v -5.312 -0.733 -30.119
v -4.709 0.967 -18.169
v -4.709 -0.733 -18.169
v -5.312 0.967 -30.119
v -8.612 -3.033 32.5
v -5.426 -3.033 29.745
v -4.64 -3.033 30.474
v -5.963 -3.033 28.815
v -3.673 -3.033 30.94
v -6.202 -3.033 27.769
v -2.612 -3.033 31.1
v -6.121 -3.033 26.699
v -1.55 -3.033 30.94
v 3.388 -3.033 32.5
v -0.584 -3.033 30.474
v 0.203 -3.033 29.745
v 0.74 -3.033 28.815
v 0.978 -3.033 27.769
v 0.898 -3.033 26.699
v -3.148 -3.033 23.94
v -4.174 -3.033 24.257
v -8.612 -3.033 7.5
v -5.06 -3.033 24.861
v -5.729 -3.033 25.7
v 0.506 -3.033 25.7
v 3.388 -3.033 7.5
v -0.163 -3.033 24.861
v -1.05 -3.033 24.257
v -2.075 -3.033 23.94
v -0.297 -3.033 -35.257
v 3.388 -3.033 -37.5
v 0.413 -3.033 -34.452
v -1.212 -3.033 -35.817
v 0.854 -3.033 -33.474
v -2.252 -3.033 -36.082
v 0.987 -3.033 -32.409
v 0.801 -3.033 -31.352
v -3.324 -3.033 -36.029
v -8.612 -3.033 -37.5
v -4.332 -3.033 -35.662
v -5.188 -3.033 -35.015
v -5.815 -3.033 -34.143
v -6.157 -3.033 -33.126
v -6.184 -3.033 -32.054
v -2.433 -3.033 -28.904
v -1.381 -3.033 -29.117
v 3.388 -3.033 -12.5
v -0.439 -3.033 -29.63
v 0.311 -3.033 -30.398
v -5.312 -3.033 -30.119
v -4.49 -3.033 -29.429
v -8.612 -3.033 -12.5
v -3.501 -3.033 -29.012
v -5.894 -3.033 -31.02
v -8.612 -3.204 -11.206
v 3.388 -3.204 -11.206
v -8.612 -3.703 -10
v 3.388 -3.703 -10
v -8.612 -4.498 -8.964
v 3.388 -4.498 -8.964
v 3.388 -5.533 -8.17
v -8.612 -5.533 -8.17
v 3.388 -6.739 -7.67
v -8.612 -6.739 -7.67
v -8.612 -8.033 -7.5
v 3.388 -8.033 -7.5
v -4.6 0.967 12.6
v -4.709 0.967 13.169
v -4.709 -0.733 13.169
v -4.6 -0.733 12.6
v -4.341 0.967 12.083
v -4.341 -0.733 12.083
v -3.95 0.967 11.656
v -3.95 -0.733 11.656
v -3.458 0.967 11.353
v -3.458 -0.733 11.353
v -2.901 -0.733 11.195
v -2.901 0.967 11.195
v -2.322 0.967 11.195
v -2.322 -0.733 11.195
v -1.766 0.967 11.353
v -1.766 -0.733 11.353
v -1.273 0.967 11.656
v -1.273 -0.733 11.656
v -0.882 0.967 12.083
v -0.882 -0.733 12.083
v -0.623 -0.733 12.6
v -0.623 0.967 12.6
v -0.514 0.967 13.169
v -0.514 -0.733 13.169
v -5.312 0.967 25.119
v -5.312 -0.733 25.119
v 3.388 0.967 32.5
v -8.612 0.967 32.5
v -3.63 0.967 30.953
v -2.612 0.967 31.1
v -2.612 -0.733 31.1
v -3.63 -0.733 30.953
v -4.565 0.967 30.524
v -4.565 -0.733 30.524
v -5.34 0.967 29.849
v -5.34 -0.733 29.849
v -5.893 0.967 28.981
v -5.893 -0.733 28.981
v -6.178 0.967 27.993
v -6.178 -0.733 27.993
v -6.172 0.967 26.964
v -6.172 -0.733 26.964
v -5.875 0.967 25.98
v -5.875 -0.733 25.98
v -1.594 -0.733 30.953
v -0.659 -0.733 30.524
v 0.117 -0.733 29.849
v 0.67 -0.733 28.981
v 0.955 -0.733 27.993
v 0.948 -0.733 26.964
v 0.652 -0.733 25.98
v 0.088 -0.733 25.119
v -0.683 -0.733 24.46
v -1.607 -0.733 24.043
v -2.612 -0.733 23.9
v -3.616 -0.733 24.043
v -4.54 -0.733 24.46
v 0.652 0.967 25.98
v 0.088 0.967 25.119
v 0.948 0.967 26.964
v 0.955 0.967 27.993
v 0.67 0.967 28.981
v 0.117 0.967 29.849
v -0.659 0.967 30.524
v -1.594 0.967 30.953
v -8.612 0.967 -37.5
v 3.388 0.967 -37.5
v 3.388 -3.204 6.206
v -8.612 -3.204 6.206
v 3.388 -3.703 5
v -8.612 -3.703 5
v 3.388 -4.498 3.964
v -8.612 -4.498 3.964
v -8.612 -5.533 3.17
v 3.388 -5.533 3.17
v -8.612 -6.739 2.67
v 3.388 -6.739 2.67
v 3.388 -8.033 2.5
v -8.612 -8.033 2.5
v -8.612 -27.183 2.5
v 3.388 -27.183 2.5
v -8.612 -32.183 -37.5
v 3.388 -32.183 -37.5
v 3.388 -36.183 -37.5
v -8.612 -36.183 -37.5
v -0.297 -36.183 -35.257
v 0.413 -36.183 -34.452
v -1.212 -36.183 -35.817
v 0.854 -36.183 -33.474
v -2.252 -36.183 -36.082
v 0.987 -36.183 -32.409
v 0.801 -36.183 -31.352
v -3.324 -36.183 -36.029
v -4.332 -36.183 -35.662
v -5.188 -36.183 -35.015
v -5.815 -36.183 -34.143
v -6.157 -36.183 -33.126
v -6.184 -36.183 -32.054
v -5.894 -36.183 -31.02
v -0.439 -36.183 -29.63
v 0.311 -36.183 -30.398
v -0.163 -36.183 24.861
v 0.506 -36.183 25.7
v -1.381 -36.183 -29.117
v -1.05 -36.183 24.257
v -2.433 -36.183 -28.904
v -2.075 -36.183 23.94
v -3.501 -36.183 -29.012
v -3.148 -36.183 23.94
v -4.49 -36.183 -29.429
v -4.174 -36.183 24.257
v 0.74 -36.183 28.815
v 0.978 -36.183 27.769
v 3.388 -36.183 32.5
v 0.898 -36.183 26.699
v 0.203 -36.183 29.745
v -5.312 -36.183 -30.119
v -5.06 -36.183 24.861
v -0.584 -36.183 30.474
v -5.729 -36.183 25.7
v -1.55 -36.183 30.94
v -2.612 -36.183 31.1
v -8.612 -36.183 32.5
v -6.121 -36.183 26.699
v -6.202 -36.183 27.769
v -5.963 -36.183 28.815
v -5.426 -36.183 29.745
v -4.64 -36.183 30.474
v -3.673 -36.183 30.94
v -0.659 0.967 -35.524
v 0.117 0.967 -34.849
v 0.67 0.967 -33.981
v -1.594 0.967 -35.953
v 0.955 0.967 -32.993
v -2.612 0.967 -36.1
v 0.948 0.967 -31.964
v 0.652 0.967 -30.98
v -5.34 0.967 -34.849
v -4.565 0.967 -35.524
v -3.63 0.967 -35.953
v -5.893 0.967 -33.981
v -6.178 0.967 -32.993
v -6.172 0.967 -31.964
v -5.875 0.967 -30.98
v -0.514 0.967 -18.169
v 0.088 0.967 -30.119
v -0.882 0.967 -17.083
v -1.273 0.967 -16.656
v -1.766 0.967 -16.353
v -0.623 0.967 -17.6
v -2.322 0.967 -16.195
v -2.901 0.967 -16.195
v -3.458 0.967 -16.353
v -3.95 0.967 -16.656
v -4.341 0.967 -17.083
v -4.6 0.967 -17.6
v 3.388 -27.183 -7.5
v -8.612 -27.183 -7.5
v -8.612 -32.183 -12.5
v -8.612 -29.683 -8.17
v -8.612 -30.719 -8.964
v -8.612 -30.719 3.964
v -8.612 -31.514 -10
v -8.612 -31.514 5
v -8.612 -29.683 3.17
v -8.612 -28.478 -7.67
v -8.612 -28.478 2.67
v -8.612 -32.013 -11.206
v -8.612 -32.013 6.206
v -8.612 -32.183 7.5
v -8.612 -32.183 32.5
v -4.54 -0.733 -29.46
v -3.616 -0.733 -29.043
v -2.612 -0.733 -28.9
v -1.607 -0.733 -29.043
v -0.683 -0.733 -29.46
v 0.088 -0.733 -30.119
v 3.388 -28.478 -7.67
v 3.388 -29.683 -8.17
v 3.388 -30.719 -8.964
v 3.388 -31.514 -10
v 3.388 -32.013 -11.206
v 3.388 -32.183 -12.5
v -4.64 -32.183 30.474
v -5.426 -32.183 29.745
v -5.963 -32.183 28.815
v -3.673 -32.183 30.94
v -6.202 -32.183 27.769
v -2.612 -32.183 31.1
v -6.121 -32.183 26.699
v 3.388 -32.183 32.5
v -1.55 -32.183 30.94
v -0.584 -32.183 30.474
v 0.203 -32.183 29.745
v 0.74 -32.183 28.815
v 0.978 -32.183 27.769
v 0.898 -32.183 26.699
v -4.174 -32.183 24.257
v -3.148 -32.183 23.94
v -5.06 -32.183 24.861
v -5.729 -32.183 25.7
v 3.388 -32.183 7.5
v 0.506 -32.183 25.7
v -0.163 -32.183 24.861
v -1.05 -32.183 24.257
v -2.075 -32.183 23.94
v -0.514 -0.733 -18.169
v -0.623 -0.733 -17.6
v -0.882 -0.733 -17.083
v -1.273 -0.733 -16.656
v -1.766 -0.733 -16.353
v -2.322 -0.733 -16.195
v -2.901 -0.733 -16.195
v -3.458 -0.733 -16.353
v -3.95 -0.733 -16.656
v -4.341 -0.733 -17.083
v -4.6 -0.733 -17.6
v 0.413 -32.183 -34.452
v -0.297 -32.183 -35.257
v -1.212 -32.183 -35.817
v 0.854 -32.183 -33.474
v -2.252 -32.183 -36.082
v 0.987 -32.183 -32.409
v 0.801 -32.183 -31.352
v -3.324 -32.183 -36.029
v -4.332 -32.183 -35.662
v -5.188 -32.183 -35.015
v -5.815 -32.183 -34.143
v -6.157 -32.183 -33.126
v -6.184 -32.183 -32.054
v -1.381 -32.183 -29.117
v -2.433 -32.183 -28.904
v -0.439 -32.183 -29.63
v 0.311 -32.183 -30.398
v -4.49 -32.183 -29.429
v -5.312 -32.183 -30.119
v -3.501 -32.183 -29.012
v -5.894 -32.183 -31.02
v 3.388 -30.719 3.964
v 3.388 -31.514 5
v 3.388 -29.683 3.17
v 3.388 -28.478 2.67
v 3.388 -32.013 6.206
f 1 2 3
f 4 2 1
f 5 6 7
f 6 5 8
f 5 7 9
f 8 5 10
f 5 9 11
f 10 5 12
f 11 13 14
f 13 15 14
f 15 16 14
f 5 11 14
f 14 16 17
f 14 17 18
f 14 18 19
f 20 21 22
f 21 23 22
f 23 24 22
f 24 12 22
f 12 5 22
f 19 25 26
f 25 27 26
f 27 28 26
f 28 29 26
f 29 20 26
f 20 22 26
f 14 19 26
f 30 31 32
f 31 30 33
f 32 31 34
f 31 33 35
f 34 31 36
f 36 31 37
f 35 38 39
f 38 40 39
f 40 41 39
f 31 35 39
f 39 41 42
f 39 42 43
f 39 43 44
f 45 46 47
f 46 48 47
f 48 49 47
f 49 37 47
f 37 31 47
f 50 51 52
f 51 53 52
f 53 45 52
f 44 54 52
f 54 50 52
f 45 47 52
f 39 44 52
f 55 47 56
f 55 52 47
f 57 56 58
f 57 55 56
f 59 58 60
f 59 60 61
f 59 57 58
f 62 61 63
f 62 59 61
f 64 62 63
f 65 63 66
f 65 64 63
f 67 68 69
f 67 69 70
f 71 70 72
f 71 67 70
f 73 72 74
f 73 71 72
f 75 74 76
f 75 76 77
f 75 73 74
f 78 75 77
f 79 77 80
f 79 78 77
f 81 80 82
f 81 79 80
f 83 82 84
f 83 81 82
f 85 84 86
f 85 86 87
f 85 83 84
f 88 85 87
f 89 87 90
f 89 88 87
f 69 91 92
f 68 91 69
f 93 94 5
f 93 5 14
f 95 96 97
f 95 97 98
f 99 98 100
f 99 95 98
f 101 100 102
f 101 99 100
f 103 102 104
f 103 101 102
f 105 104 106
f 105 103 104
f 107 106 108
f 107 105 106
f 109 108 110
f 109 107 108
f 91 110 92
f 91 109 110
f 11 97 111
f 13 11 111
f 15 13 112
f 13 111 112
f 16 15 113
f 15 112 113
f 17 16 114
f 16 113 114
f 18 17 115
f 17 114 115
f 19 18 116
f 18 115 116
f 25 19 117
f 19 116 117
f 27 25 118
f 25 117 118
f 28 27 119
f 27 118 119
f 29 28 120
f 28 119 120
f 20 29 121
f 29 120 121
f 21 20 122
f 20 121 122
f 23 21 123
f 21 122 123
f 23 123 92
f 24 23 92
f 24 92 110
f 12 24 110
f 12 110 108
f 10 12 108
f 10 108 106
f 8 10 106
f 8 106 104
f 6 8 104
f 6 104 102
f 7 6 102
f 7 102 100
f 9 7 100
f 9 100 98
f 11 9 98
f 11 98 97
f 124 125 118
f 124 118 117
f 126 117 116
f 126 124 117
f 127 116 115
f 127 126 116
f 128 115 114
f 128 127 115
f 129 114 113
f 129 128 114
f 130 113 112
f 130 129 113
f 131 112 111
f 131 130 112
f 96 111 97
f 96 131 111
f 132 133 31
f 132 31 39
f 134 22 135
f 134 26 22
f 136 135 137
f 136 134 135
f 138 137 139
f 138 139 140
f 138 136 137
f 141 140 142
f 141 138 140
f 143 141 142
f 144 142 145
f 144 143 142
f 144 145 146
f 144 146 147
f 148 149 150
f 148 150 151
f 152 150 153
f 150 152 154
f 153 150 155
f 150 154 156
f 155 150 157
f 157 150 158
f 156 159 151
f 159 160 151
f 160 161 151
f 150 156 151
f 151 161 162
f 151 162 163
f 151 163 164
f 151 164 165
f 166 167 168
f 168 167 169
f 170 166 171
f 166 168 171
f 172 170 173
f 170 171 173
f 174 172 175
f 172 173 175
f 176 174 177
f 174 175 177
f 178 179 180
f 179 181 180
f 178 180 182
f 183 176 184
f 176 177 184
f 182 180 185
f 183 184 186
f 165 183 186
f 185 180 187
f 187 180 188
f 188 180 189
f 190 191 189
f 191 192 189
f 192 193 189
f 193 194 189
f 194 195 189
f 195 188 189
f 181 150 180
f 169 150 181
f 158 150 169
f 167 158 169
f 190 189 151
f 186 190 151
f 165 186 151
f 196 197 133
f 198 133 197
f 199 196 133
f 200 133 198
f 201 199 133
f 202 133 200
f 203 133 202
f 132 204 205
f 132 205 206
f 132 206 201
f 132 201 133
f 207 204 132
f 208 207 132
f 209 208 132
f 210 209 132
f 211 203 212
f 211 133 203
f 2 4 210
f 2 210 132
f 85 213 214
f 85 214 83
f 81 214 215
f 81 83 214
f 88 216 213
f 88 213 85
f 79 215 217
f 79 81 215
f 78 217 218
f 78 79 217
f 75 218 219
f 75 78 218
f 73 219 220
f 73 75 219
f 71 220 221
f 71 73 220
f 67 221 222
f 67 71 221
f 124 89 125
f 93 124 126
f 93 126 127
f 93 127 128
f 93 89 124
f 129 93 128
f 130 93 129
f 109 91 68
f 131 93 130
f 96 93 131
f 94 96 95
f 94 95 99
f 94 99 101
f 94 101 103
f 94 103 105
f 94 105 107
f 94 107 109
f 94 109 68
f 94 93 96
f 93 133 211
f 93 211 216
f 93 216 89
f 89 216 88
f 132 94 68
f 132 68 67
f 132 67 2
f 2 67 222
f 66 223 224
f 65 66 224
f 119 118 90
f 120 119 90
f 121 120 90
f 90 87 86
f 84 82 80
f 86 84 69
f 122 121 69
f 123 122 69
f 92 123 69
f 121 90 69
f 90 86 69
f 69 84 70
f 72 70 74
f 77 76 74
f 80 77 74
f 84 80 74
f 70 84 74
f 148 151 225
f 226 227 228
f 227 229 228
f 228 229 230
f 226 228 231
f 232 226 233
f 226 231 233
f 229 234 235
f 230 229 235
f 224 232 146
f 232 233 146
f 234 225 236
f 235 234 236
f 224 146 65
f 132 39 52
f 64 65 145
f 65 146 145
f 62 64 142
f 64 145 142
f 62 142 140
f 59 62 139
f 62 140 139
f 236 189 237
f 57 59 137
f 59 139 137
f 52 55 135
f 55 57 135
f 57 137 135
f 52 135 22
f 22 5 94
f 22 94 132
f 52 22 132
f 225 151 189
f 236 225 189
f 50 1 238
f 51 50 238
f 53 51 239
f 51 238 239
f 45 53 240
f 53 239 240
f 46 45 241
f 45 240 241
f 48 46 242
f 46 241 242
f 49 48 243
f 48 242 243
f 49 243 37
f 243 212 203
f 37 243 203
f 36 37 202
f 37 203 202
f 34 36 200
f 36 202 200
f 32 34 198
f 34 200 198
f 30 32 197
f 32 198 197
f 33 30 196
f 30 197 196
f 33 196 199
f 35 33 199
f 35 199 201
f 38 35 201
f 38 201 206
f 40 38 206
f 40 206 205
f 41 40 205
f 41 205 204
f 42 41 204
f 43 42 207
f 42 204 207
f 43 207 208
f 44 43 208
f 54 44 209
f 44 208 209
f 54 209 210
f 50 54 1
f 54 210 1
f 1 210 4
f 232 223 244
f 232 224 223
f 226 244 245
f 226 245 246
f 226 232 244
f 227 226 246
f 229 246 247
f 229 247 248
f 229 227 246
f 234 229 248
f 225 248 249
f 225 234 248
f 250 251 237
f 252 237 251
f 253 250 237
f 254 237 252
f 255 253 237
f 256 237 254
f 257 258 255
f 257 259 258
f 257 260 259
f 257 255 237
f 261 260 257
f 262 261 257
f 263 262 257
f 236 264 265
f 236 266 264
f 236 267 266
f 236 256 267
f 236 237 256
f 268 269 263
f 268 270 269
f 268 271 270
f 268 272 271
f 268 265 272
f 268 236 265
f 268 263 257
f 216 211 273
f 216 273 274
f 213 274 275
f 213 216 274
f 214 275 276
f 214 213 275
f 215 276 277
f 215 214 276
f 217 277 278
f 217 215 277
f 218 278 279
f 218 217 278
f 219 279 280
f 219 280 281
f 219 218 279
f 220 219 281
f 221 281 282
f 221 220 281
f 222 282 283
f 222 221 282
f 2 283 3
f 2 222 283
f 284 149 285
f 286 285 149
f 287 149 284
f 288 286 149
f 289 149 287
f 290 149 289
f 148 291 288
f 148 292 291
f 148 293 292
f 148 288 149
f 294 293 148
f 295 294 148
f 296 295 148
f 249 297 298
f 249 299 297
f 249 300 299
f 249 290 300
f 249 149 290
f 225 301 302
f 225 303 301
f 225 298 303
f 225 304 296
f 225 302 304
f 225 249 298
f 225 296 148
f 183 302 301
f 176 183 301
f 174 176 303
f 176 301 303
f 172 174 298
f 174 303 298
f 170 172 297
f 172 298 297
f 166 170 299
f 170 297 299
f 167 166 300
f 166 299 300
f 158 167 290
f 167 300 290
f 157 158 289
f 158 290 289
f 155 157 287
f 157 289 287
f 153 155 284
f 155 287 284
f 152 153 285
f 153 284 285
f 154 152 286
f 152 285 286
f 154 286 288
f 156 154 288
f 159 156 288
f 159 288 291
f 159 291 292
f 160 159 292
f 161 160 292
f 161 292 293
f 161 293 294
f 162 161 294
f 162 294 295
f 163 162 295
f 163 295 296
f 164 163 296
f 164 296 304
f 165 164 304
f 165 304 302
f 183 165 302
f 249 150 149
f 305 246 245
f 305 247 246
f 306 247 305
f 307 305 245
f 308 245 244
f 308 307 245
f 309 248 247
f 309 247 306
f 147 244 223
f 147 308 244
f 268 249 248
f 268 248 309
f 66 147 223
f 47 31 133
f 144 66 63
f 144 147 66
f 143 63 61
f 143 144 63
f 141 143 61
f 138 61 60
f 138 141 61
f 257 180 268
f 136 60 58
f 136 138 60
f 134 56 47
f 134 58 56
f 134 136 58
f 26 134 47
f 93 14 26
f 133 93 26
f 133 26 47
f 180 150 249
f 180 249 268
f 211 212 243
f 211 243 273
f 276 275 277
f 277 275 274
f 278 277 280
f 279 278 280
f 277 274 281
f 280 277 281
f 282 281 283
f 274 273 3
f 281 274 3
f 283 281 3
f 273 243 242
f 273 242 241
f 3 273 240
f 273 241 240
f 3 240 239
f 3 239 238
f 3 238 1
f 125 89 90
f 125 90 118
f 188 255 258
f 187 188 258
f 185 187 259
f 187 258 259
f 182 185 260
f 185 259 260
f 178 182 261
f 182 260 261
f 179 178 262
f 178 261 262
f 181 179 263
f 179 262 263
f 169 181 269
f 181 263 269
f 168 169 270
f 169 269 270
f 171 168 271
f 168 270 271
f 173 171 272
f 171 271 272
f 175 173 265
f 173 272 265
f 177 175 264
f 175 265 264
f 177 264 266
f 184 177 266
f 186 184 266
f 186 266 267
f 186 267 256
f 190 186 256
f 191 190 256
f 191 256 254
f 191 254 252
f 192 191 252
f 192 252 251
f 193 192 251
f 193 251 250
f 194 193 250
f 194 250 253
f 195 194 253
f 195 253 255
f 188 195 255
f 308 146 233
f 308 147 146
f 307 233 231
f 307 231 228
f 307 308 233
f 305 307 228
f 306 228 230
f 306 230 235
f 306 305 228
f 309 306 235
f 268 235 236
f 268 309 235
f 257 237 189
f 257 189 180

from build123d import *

# Parameters (mm, degrees)
SKETCH2_W            = 12
SKETCH2_H            = 37.15
BOSS_EXTRUDE2_DEPTH  = 2.5
SKETCH11_W           = 12
SKETCH11_H           = 4
BOSS_EXTRUDE8_DEPTH  = 30
CUT_EXTRUDE1_DEPTH   = 1.7
SKETCH14_W           = 12
SKETCH14_H           = 37.15
BOSS_EXTRUDE9_DEPTH  = 7.5
SKETCH16_W           = 12
SKETCH16_H           = 4
BOSS_EXTRUDE11_DEPTH = 30
CUT_EXTRUDE4_DEPTH   = 1.7
SKETCH22_R           = 3.6
CUT_EXTRUDE6_DEPTH   = 54.483943136
SKETCH23_R           = 3.6
CUT_EXTRUDE7_DEPTH   = 54.483943136
FILLET1_R            = 5
FILLET2_R            = 5
FILLET3_R            = 5
FILLET4_R            = 5


with BuildPart() as part:
    # Sketch2 → Boss-Extrude2 (new body)
    with BuildSketch(Plane.XY):
        with Locations((-2.61160109, -17.608451256)):
            Rectangle(SKETCH2_W, SKETCH2_H)
    extrude(amount=BOSS_EXTRUDE2_DEPTH)

    # Sketch11 → Boss-Extrude8 (add)
    with BuildSketch(Plane.XY.offset(2.5)):
        with Locations((-2.61160109, -1.033451256)):
            Rectangle(SKETCH11_W, SKETCH11_H)
        with Locations((-2.61160109, -34.183451256)):
            Rectangle(SKETCH11_W, SKETCH11_H)
    extrude(amount=BOSS_EXTRUDE8_DEPTH)

    # Sketch12 → Cut-Extrude1 (cut)
    with BuildSketch(Plane(origin=(0, 0.966548744, 0), x_dir=(1, 0, 0), z_dir=(0, 1, 0))):
        with BuildLine():
            Line((-0.514266567, -13.168774056), (0.08839891, -25.11882382))
            ThreePointArc((0.08839891, -25.11882382), (-2.61160109, -31.1), (-5.31160109, -25.11882382))
            Line((-5.31160109, -25.11882382), (-4.708935612, -13.168774056))
            ThreePointArc((-4.708935612, -13.168774056), (-2.61160109, -11.174546931), (-0.514266567, -13.168774056))
        make_face()
    extrude(amount=-CUT_EXTRUDE1_DEPTH, mode=Mode.SUBTRACT)

    # Sketch14 → Boss-Extrude9 (add)
    with BuildSketch(Plane(origin=(0, 0, 0), x_dir=(-1, 0, 0), z_dir=(0, 0, -1))):
        with Locations((2.61160109, -17.608451256)):
            Rectangle(SKETCH14_W, SKETCH14_H)
    extrude(amount=BOSS_EXTRUDE9_DEPTH)

    # Sketch16 → Boss-Extrude11 (add)
    with BuildSketch(Plane(origin=(0, 0, -7.5), x_dir=(-1, 0, 0), z_dir=(0, 0, -1))):
        with Locations((2.61160109, -1.033451256)):
            Rectangle(SKETCH16_W, SKETCH16_H)
        with Locations((2.61160109, -34.183451256)):
            Rectangle(SKETCH16_W, SKETCH16_H)
    extrude(amount=BOSS_EXTRUDE11_DEPTH)

    # Sketch20 → Cut-Extrude4 (cut)
    with BuildSketch(Plane(origin=(0, 0.966548744, 0), x_dir=(1, 0, 0), z_dir=(0, 1, 0))):
        with BuildLine():
            Line((-4.708935612, 18.168774056), (-5.31160109, 30.11882382))
            ThreePointArc((-5.31160109, 30.11882382), (-2.61160109, 36.1), (0.08839891, 30.11882382))
            Line((0.08839891, 30.11882382), (-0.514266567, 18.168774056))
            ThreePointArc((-0.514266567, 18.168774056), (-2.61160109, 16.174546931), (-4.708935612, 18.168774056))
        make_face()
    extrude(amount=-CUT_EXTRUDE4_DEPTH, mode=Mode.SUBTRACT)

    # Sketch22 → Cut-Extrude6 (cut, through all)
    with BuildSketch(Plane(origin=(0, 0.966548744, 0), x_dir=(1, 0, 0), z_dir=(0, 1, 0))):
        with Locations(Location((-2.61160109, -27.5, 0), (0, 0, 270))):
            Circle(SKETCH22_R)
    extrude(amount=-CUT_EXTRUDE6_DEPTH, mode=Mode.SUBTRACT)

    # Sketch23 → Cut-Extrude7 (cut, through all)
    with BuildSketch(Plane(origin=(0, 0.966548744, 0), x_dir=(1, 0, 0), z_dir=(0, 1, 0))):
        with Locations(Location((-2.61160109, 32.5, 0), (0, 0, 221.409622109))):
            Circle(SKETCH23_R)
    extrude(amount=-CUT_EXTRUDE7_DEPTH, mode=Mode.SUBTRACT)

    # Fillet1
    fillet1_edges = [part.edges().sort_by_distance(p)[0] for p in [
        (-2.61160109, -3.033451256, 2.5),
    ]]
    fillet(fillet1_edges, radius=FILLET1_R)

    # Fillet2
    fillet2_edges = [part.edges().sort_by_distance(p)[0] for p in [
        (-2.61160109, -32.183451256, 2.5),
    ]]
    fillet(fillet2_edges, radius=FILLET2_R)

    # Fillet3
    fillet3_edges = [part.edges().sort_by_distance(p)[0] for p in [
        (-2.61160109, -3.033451256, -7.5),
    ]]
    fillet(fillet3_edges, radius=FILLET3_R)

    # Fillet4
    fillet4_edges = [part.edges().sort_by_distance(p)[0] for p in [
        (-2.61160109, -32.183451256, -7.5),
    ]]
    fillet(fillet4_edges, radius=FILLET4_R)


solid = part.part
